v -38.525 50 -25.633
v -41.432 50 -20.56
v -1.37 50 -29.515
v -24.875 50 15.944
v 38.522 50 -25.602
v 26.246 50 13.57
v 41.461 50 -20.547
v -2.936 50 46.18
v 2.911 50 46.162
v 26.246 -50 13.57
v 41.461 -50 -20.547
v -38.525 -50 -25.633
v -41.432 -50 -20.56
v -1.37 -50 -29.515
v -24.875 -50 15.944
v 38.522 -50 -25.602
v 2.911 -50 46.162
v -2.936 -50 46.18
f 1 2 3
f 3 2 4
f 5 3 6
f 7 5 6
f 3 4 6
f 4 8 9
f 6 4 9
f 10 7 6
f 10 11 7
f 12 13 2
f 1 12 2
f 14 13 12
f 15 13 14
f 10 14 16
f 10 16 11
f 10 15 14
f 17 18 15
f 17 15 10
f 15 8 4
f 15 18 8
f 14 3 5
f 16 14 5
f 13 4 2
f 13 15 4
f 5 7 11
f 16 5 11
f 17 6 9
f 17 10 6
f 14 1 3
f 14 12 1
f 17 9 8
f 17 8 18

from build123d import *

# Parameters (mm, degrees)
F1_DEPTH = 50
F2_SIZE  = 5


with BuildPart() as f1:
    # F0 (on Front) → F1 (new body, symmetric)
    with BuildSketch(Plane.XZ):
        Polygon((26.245609, 13.570482), (0, 0), (43.497787, -25.113462), align=None)
        Polygon((43.497787, -25.113462), (0, 0), (-1.370423, -29.514605), align=None)
        Polygon((0, 50.226919), (0, 0), (26.245609, 13.570482), align=None)
        Polygon((-24.875186, 15.944123), (0, 0), (0, 50.226919), align=None)
        Polygon((-43.497791, -25.113455), (0, 0), (-24.875186, 15.944123), align=None)
        Polygon((-1.370423, -29.514605), (0, 0), (-43.497791, -25.113455), align=None)
    extrude(amount=F1_DEPTH, both=True)

    # F2
    f2_edges = [f1.edges().sort_by_distance(p)[0] for p in [
        (-43.497791, 0, -25.113455),
        (43.497787, 0, -25.113462),
        (0, 0, 50.226919),
    ]]
    chamfer(f2_edges, length=F2_SIZE)


solid = f1.part
